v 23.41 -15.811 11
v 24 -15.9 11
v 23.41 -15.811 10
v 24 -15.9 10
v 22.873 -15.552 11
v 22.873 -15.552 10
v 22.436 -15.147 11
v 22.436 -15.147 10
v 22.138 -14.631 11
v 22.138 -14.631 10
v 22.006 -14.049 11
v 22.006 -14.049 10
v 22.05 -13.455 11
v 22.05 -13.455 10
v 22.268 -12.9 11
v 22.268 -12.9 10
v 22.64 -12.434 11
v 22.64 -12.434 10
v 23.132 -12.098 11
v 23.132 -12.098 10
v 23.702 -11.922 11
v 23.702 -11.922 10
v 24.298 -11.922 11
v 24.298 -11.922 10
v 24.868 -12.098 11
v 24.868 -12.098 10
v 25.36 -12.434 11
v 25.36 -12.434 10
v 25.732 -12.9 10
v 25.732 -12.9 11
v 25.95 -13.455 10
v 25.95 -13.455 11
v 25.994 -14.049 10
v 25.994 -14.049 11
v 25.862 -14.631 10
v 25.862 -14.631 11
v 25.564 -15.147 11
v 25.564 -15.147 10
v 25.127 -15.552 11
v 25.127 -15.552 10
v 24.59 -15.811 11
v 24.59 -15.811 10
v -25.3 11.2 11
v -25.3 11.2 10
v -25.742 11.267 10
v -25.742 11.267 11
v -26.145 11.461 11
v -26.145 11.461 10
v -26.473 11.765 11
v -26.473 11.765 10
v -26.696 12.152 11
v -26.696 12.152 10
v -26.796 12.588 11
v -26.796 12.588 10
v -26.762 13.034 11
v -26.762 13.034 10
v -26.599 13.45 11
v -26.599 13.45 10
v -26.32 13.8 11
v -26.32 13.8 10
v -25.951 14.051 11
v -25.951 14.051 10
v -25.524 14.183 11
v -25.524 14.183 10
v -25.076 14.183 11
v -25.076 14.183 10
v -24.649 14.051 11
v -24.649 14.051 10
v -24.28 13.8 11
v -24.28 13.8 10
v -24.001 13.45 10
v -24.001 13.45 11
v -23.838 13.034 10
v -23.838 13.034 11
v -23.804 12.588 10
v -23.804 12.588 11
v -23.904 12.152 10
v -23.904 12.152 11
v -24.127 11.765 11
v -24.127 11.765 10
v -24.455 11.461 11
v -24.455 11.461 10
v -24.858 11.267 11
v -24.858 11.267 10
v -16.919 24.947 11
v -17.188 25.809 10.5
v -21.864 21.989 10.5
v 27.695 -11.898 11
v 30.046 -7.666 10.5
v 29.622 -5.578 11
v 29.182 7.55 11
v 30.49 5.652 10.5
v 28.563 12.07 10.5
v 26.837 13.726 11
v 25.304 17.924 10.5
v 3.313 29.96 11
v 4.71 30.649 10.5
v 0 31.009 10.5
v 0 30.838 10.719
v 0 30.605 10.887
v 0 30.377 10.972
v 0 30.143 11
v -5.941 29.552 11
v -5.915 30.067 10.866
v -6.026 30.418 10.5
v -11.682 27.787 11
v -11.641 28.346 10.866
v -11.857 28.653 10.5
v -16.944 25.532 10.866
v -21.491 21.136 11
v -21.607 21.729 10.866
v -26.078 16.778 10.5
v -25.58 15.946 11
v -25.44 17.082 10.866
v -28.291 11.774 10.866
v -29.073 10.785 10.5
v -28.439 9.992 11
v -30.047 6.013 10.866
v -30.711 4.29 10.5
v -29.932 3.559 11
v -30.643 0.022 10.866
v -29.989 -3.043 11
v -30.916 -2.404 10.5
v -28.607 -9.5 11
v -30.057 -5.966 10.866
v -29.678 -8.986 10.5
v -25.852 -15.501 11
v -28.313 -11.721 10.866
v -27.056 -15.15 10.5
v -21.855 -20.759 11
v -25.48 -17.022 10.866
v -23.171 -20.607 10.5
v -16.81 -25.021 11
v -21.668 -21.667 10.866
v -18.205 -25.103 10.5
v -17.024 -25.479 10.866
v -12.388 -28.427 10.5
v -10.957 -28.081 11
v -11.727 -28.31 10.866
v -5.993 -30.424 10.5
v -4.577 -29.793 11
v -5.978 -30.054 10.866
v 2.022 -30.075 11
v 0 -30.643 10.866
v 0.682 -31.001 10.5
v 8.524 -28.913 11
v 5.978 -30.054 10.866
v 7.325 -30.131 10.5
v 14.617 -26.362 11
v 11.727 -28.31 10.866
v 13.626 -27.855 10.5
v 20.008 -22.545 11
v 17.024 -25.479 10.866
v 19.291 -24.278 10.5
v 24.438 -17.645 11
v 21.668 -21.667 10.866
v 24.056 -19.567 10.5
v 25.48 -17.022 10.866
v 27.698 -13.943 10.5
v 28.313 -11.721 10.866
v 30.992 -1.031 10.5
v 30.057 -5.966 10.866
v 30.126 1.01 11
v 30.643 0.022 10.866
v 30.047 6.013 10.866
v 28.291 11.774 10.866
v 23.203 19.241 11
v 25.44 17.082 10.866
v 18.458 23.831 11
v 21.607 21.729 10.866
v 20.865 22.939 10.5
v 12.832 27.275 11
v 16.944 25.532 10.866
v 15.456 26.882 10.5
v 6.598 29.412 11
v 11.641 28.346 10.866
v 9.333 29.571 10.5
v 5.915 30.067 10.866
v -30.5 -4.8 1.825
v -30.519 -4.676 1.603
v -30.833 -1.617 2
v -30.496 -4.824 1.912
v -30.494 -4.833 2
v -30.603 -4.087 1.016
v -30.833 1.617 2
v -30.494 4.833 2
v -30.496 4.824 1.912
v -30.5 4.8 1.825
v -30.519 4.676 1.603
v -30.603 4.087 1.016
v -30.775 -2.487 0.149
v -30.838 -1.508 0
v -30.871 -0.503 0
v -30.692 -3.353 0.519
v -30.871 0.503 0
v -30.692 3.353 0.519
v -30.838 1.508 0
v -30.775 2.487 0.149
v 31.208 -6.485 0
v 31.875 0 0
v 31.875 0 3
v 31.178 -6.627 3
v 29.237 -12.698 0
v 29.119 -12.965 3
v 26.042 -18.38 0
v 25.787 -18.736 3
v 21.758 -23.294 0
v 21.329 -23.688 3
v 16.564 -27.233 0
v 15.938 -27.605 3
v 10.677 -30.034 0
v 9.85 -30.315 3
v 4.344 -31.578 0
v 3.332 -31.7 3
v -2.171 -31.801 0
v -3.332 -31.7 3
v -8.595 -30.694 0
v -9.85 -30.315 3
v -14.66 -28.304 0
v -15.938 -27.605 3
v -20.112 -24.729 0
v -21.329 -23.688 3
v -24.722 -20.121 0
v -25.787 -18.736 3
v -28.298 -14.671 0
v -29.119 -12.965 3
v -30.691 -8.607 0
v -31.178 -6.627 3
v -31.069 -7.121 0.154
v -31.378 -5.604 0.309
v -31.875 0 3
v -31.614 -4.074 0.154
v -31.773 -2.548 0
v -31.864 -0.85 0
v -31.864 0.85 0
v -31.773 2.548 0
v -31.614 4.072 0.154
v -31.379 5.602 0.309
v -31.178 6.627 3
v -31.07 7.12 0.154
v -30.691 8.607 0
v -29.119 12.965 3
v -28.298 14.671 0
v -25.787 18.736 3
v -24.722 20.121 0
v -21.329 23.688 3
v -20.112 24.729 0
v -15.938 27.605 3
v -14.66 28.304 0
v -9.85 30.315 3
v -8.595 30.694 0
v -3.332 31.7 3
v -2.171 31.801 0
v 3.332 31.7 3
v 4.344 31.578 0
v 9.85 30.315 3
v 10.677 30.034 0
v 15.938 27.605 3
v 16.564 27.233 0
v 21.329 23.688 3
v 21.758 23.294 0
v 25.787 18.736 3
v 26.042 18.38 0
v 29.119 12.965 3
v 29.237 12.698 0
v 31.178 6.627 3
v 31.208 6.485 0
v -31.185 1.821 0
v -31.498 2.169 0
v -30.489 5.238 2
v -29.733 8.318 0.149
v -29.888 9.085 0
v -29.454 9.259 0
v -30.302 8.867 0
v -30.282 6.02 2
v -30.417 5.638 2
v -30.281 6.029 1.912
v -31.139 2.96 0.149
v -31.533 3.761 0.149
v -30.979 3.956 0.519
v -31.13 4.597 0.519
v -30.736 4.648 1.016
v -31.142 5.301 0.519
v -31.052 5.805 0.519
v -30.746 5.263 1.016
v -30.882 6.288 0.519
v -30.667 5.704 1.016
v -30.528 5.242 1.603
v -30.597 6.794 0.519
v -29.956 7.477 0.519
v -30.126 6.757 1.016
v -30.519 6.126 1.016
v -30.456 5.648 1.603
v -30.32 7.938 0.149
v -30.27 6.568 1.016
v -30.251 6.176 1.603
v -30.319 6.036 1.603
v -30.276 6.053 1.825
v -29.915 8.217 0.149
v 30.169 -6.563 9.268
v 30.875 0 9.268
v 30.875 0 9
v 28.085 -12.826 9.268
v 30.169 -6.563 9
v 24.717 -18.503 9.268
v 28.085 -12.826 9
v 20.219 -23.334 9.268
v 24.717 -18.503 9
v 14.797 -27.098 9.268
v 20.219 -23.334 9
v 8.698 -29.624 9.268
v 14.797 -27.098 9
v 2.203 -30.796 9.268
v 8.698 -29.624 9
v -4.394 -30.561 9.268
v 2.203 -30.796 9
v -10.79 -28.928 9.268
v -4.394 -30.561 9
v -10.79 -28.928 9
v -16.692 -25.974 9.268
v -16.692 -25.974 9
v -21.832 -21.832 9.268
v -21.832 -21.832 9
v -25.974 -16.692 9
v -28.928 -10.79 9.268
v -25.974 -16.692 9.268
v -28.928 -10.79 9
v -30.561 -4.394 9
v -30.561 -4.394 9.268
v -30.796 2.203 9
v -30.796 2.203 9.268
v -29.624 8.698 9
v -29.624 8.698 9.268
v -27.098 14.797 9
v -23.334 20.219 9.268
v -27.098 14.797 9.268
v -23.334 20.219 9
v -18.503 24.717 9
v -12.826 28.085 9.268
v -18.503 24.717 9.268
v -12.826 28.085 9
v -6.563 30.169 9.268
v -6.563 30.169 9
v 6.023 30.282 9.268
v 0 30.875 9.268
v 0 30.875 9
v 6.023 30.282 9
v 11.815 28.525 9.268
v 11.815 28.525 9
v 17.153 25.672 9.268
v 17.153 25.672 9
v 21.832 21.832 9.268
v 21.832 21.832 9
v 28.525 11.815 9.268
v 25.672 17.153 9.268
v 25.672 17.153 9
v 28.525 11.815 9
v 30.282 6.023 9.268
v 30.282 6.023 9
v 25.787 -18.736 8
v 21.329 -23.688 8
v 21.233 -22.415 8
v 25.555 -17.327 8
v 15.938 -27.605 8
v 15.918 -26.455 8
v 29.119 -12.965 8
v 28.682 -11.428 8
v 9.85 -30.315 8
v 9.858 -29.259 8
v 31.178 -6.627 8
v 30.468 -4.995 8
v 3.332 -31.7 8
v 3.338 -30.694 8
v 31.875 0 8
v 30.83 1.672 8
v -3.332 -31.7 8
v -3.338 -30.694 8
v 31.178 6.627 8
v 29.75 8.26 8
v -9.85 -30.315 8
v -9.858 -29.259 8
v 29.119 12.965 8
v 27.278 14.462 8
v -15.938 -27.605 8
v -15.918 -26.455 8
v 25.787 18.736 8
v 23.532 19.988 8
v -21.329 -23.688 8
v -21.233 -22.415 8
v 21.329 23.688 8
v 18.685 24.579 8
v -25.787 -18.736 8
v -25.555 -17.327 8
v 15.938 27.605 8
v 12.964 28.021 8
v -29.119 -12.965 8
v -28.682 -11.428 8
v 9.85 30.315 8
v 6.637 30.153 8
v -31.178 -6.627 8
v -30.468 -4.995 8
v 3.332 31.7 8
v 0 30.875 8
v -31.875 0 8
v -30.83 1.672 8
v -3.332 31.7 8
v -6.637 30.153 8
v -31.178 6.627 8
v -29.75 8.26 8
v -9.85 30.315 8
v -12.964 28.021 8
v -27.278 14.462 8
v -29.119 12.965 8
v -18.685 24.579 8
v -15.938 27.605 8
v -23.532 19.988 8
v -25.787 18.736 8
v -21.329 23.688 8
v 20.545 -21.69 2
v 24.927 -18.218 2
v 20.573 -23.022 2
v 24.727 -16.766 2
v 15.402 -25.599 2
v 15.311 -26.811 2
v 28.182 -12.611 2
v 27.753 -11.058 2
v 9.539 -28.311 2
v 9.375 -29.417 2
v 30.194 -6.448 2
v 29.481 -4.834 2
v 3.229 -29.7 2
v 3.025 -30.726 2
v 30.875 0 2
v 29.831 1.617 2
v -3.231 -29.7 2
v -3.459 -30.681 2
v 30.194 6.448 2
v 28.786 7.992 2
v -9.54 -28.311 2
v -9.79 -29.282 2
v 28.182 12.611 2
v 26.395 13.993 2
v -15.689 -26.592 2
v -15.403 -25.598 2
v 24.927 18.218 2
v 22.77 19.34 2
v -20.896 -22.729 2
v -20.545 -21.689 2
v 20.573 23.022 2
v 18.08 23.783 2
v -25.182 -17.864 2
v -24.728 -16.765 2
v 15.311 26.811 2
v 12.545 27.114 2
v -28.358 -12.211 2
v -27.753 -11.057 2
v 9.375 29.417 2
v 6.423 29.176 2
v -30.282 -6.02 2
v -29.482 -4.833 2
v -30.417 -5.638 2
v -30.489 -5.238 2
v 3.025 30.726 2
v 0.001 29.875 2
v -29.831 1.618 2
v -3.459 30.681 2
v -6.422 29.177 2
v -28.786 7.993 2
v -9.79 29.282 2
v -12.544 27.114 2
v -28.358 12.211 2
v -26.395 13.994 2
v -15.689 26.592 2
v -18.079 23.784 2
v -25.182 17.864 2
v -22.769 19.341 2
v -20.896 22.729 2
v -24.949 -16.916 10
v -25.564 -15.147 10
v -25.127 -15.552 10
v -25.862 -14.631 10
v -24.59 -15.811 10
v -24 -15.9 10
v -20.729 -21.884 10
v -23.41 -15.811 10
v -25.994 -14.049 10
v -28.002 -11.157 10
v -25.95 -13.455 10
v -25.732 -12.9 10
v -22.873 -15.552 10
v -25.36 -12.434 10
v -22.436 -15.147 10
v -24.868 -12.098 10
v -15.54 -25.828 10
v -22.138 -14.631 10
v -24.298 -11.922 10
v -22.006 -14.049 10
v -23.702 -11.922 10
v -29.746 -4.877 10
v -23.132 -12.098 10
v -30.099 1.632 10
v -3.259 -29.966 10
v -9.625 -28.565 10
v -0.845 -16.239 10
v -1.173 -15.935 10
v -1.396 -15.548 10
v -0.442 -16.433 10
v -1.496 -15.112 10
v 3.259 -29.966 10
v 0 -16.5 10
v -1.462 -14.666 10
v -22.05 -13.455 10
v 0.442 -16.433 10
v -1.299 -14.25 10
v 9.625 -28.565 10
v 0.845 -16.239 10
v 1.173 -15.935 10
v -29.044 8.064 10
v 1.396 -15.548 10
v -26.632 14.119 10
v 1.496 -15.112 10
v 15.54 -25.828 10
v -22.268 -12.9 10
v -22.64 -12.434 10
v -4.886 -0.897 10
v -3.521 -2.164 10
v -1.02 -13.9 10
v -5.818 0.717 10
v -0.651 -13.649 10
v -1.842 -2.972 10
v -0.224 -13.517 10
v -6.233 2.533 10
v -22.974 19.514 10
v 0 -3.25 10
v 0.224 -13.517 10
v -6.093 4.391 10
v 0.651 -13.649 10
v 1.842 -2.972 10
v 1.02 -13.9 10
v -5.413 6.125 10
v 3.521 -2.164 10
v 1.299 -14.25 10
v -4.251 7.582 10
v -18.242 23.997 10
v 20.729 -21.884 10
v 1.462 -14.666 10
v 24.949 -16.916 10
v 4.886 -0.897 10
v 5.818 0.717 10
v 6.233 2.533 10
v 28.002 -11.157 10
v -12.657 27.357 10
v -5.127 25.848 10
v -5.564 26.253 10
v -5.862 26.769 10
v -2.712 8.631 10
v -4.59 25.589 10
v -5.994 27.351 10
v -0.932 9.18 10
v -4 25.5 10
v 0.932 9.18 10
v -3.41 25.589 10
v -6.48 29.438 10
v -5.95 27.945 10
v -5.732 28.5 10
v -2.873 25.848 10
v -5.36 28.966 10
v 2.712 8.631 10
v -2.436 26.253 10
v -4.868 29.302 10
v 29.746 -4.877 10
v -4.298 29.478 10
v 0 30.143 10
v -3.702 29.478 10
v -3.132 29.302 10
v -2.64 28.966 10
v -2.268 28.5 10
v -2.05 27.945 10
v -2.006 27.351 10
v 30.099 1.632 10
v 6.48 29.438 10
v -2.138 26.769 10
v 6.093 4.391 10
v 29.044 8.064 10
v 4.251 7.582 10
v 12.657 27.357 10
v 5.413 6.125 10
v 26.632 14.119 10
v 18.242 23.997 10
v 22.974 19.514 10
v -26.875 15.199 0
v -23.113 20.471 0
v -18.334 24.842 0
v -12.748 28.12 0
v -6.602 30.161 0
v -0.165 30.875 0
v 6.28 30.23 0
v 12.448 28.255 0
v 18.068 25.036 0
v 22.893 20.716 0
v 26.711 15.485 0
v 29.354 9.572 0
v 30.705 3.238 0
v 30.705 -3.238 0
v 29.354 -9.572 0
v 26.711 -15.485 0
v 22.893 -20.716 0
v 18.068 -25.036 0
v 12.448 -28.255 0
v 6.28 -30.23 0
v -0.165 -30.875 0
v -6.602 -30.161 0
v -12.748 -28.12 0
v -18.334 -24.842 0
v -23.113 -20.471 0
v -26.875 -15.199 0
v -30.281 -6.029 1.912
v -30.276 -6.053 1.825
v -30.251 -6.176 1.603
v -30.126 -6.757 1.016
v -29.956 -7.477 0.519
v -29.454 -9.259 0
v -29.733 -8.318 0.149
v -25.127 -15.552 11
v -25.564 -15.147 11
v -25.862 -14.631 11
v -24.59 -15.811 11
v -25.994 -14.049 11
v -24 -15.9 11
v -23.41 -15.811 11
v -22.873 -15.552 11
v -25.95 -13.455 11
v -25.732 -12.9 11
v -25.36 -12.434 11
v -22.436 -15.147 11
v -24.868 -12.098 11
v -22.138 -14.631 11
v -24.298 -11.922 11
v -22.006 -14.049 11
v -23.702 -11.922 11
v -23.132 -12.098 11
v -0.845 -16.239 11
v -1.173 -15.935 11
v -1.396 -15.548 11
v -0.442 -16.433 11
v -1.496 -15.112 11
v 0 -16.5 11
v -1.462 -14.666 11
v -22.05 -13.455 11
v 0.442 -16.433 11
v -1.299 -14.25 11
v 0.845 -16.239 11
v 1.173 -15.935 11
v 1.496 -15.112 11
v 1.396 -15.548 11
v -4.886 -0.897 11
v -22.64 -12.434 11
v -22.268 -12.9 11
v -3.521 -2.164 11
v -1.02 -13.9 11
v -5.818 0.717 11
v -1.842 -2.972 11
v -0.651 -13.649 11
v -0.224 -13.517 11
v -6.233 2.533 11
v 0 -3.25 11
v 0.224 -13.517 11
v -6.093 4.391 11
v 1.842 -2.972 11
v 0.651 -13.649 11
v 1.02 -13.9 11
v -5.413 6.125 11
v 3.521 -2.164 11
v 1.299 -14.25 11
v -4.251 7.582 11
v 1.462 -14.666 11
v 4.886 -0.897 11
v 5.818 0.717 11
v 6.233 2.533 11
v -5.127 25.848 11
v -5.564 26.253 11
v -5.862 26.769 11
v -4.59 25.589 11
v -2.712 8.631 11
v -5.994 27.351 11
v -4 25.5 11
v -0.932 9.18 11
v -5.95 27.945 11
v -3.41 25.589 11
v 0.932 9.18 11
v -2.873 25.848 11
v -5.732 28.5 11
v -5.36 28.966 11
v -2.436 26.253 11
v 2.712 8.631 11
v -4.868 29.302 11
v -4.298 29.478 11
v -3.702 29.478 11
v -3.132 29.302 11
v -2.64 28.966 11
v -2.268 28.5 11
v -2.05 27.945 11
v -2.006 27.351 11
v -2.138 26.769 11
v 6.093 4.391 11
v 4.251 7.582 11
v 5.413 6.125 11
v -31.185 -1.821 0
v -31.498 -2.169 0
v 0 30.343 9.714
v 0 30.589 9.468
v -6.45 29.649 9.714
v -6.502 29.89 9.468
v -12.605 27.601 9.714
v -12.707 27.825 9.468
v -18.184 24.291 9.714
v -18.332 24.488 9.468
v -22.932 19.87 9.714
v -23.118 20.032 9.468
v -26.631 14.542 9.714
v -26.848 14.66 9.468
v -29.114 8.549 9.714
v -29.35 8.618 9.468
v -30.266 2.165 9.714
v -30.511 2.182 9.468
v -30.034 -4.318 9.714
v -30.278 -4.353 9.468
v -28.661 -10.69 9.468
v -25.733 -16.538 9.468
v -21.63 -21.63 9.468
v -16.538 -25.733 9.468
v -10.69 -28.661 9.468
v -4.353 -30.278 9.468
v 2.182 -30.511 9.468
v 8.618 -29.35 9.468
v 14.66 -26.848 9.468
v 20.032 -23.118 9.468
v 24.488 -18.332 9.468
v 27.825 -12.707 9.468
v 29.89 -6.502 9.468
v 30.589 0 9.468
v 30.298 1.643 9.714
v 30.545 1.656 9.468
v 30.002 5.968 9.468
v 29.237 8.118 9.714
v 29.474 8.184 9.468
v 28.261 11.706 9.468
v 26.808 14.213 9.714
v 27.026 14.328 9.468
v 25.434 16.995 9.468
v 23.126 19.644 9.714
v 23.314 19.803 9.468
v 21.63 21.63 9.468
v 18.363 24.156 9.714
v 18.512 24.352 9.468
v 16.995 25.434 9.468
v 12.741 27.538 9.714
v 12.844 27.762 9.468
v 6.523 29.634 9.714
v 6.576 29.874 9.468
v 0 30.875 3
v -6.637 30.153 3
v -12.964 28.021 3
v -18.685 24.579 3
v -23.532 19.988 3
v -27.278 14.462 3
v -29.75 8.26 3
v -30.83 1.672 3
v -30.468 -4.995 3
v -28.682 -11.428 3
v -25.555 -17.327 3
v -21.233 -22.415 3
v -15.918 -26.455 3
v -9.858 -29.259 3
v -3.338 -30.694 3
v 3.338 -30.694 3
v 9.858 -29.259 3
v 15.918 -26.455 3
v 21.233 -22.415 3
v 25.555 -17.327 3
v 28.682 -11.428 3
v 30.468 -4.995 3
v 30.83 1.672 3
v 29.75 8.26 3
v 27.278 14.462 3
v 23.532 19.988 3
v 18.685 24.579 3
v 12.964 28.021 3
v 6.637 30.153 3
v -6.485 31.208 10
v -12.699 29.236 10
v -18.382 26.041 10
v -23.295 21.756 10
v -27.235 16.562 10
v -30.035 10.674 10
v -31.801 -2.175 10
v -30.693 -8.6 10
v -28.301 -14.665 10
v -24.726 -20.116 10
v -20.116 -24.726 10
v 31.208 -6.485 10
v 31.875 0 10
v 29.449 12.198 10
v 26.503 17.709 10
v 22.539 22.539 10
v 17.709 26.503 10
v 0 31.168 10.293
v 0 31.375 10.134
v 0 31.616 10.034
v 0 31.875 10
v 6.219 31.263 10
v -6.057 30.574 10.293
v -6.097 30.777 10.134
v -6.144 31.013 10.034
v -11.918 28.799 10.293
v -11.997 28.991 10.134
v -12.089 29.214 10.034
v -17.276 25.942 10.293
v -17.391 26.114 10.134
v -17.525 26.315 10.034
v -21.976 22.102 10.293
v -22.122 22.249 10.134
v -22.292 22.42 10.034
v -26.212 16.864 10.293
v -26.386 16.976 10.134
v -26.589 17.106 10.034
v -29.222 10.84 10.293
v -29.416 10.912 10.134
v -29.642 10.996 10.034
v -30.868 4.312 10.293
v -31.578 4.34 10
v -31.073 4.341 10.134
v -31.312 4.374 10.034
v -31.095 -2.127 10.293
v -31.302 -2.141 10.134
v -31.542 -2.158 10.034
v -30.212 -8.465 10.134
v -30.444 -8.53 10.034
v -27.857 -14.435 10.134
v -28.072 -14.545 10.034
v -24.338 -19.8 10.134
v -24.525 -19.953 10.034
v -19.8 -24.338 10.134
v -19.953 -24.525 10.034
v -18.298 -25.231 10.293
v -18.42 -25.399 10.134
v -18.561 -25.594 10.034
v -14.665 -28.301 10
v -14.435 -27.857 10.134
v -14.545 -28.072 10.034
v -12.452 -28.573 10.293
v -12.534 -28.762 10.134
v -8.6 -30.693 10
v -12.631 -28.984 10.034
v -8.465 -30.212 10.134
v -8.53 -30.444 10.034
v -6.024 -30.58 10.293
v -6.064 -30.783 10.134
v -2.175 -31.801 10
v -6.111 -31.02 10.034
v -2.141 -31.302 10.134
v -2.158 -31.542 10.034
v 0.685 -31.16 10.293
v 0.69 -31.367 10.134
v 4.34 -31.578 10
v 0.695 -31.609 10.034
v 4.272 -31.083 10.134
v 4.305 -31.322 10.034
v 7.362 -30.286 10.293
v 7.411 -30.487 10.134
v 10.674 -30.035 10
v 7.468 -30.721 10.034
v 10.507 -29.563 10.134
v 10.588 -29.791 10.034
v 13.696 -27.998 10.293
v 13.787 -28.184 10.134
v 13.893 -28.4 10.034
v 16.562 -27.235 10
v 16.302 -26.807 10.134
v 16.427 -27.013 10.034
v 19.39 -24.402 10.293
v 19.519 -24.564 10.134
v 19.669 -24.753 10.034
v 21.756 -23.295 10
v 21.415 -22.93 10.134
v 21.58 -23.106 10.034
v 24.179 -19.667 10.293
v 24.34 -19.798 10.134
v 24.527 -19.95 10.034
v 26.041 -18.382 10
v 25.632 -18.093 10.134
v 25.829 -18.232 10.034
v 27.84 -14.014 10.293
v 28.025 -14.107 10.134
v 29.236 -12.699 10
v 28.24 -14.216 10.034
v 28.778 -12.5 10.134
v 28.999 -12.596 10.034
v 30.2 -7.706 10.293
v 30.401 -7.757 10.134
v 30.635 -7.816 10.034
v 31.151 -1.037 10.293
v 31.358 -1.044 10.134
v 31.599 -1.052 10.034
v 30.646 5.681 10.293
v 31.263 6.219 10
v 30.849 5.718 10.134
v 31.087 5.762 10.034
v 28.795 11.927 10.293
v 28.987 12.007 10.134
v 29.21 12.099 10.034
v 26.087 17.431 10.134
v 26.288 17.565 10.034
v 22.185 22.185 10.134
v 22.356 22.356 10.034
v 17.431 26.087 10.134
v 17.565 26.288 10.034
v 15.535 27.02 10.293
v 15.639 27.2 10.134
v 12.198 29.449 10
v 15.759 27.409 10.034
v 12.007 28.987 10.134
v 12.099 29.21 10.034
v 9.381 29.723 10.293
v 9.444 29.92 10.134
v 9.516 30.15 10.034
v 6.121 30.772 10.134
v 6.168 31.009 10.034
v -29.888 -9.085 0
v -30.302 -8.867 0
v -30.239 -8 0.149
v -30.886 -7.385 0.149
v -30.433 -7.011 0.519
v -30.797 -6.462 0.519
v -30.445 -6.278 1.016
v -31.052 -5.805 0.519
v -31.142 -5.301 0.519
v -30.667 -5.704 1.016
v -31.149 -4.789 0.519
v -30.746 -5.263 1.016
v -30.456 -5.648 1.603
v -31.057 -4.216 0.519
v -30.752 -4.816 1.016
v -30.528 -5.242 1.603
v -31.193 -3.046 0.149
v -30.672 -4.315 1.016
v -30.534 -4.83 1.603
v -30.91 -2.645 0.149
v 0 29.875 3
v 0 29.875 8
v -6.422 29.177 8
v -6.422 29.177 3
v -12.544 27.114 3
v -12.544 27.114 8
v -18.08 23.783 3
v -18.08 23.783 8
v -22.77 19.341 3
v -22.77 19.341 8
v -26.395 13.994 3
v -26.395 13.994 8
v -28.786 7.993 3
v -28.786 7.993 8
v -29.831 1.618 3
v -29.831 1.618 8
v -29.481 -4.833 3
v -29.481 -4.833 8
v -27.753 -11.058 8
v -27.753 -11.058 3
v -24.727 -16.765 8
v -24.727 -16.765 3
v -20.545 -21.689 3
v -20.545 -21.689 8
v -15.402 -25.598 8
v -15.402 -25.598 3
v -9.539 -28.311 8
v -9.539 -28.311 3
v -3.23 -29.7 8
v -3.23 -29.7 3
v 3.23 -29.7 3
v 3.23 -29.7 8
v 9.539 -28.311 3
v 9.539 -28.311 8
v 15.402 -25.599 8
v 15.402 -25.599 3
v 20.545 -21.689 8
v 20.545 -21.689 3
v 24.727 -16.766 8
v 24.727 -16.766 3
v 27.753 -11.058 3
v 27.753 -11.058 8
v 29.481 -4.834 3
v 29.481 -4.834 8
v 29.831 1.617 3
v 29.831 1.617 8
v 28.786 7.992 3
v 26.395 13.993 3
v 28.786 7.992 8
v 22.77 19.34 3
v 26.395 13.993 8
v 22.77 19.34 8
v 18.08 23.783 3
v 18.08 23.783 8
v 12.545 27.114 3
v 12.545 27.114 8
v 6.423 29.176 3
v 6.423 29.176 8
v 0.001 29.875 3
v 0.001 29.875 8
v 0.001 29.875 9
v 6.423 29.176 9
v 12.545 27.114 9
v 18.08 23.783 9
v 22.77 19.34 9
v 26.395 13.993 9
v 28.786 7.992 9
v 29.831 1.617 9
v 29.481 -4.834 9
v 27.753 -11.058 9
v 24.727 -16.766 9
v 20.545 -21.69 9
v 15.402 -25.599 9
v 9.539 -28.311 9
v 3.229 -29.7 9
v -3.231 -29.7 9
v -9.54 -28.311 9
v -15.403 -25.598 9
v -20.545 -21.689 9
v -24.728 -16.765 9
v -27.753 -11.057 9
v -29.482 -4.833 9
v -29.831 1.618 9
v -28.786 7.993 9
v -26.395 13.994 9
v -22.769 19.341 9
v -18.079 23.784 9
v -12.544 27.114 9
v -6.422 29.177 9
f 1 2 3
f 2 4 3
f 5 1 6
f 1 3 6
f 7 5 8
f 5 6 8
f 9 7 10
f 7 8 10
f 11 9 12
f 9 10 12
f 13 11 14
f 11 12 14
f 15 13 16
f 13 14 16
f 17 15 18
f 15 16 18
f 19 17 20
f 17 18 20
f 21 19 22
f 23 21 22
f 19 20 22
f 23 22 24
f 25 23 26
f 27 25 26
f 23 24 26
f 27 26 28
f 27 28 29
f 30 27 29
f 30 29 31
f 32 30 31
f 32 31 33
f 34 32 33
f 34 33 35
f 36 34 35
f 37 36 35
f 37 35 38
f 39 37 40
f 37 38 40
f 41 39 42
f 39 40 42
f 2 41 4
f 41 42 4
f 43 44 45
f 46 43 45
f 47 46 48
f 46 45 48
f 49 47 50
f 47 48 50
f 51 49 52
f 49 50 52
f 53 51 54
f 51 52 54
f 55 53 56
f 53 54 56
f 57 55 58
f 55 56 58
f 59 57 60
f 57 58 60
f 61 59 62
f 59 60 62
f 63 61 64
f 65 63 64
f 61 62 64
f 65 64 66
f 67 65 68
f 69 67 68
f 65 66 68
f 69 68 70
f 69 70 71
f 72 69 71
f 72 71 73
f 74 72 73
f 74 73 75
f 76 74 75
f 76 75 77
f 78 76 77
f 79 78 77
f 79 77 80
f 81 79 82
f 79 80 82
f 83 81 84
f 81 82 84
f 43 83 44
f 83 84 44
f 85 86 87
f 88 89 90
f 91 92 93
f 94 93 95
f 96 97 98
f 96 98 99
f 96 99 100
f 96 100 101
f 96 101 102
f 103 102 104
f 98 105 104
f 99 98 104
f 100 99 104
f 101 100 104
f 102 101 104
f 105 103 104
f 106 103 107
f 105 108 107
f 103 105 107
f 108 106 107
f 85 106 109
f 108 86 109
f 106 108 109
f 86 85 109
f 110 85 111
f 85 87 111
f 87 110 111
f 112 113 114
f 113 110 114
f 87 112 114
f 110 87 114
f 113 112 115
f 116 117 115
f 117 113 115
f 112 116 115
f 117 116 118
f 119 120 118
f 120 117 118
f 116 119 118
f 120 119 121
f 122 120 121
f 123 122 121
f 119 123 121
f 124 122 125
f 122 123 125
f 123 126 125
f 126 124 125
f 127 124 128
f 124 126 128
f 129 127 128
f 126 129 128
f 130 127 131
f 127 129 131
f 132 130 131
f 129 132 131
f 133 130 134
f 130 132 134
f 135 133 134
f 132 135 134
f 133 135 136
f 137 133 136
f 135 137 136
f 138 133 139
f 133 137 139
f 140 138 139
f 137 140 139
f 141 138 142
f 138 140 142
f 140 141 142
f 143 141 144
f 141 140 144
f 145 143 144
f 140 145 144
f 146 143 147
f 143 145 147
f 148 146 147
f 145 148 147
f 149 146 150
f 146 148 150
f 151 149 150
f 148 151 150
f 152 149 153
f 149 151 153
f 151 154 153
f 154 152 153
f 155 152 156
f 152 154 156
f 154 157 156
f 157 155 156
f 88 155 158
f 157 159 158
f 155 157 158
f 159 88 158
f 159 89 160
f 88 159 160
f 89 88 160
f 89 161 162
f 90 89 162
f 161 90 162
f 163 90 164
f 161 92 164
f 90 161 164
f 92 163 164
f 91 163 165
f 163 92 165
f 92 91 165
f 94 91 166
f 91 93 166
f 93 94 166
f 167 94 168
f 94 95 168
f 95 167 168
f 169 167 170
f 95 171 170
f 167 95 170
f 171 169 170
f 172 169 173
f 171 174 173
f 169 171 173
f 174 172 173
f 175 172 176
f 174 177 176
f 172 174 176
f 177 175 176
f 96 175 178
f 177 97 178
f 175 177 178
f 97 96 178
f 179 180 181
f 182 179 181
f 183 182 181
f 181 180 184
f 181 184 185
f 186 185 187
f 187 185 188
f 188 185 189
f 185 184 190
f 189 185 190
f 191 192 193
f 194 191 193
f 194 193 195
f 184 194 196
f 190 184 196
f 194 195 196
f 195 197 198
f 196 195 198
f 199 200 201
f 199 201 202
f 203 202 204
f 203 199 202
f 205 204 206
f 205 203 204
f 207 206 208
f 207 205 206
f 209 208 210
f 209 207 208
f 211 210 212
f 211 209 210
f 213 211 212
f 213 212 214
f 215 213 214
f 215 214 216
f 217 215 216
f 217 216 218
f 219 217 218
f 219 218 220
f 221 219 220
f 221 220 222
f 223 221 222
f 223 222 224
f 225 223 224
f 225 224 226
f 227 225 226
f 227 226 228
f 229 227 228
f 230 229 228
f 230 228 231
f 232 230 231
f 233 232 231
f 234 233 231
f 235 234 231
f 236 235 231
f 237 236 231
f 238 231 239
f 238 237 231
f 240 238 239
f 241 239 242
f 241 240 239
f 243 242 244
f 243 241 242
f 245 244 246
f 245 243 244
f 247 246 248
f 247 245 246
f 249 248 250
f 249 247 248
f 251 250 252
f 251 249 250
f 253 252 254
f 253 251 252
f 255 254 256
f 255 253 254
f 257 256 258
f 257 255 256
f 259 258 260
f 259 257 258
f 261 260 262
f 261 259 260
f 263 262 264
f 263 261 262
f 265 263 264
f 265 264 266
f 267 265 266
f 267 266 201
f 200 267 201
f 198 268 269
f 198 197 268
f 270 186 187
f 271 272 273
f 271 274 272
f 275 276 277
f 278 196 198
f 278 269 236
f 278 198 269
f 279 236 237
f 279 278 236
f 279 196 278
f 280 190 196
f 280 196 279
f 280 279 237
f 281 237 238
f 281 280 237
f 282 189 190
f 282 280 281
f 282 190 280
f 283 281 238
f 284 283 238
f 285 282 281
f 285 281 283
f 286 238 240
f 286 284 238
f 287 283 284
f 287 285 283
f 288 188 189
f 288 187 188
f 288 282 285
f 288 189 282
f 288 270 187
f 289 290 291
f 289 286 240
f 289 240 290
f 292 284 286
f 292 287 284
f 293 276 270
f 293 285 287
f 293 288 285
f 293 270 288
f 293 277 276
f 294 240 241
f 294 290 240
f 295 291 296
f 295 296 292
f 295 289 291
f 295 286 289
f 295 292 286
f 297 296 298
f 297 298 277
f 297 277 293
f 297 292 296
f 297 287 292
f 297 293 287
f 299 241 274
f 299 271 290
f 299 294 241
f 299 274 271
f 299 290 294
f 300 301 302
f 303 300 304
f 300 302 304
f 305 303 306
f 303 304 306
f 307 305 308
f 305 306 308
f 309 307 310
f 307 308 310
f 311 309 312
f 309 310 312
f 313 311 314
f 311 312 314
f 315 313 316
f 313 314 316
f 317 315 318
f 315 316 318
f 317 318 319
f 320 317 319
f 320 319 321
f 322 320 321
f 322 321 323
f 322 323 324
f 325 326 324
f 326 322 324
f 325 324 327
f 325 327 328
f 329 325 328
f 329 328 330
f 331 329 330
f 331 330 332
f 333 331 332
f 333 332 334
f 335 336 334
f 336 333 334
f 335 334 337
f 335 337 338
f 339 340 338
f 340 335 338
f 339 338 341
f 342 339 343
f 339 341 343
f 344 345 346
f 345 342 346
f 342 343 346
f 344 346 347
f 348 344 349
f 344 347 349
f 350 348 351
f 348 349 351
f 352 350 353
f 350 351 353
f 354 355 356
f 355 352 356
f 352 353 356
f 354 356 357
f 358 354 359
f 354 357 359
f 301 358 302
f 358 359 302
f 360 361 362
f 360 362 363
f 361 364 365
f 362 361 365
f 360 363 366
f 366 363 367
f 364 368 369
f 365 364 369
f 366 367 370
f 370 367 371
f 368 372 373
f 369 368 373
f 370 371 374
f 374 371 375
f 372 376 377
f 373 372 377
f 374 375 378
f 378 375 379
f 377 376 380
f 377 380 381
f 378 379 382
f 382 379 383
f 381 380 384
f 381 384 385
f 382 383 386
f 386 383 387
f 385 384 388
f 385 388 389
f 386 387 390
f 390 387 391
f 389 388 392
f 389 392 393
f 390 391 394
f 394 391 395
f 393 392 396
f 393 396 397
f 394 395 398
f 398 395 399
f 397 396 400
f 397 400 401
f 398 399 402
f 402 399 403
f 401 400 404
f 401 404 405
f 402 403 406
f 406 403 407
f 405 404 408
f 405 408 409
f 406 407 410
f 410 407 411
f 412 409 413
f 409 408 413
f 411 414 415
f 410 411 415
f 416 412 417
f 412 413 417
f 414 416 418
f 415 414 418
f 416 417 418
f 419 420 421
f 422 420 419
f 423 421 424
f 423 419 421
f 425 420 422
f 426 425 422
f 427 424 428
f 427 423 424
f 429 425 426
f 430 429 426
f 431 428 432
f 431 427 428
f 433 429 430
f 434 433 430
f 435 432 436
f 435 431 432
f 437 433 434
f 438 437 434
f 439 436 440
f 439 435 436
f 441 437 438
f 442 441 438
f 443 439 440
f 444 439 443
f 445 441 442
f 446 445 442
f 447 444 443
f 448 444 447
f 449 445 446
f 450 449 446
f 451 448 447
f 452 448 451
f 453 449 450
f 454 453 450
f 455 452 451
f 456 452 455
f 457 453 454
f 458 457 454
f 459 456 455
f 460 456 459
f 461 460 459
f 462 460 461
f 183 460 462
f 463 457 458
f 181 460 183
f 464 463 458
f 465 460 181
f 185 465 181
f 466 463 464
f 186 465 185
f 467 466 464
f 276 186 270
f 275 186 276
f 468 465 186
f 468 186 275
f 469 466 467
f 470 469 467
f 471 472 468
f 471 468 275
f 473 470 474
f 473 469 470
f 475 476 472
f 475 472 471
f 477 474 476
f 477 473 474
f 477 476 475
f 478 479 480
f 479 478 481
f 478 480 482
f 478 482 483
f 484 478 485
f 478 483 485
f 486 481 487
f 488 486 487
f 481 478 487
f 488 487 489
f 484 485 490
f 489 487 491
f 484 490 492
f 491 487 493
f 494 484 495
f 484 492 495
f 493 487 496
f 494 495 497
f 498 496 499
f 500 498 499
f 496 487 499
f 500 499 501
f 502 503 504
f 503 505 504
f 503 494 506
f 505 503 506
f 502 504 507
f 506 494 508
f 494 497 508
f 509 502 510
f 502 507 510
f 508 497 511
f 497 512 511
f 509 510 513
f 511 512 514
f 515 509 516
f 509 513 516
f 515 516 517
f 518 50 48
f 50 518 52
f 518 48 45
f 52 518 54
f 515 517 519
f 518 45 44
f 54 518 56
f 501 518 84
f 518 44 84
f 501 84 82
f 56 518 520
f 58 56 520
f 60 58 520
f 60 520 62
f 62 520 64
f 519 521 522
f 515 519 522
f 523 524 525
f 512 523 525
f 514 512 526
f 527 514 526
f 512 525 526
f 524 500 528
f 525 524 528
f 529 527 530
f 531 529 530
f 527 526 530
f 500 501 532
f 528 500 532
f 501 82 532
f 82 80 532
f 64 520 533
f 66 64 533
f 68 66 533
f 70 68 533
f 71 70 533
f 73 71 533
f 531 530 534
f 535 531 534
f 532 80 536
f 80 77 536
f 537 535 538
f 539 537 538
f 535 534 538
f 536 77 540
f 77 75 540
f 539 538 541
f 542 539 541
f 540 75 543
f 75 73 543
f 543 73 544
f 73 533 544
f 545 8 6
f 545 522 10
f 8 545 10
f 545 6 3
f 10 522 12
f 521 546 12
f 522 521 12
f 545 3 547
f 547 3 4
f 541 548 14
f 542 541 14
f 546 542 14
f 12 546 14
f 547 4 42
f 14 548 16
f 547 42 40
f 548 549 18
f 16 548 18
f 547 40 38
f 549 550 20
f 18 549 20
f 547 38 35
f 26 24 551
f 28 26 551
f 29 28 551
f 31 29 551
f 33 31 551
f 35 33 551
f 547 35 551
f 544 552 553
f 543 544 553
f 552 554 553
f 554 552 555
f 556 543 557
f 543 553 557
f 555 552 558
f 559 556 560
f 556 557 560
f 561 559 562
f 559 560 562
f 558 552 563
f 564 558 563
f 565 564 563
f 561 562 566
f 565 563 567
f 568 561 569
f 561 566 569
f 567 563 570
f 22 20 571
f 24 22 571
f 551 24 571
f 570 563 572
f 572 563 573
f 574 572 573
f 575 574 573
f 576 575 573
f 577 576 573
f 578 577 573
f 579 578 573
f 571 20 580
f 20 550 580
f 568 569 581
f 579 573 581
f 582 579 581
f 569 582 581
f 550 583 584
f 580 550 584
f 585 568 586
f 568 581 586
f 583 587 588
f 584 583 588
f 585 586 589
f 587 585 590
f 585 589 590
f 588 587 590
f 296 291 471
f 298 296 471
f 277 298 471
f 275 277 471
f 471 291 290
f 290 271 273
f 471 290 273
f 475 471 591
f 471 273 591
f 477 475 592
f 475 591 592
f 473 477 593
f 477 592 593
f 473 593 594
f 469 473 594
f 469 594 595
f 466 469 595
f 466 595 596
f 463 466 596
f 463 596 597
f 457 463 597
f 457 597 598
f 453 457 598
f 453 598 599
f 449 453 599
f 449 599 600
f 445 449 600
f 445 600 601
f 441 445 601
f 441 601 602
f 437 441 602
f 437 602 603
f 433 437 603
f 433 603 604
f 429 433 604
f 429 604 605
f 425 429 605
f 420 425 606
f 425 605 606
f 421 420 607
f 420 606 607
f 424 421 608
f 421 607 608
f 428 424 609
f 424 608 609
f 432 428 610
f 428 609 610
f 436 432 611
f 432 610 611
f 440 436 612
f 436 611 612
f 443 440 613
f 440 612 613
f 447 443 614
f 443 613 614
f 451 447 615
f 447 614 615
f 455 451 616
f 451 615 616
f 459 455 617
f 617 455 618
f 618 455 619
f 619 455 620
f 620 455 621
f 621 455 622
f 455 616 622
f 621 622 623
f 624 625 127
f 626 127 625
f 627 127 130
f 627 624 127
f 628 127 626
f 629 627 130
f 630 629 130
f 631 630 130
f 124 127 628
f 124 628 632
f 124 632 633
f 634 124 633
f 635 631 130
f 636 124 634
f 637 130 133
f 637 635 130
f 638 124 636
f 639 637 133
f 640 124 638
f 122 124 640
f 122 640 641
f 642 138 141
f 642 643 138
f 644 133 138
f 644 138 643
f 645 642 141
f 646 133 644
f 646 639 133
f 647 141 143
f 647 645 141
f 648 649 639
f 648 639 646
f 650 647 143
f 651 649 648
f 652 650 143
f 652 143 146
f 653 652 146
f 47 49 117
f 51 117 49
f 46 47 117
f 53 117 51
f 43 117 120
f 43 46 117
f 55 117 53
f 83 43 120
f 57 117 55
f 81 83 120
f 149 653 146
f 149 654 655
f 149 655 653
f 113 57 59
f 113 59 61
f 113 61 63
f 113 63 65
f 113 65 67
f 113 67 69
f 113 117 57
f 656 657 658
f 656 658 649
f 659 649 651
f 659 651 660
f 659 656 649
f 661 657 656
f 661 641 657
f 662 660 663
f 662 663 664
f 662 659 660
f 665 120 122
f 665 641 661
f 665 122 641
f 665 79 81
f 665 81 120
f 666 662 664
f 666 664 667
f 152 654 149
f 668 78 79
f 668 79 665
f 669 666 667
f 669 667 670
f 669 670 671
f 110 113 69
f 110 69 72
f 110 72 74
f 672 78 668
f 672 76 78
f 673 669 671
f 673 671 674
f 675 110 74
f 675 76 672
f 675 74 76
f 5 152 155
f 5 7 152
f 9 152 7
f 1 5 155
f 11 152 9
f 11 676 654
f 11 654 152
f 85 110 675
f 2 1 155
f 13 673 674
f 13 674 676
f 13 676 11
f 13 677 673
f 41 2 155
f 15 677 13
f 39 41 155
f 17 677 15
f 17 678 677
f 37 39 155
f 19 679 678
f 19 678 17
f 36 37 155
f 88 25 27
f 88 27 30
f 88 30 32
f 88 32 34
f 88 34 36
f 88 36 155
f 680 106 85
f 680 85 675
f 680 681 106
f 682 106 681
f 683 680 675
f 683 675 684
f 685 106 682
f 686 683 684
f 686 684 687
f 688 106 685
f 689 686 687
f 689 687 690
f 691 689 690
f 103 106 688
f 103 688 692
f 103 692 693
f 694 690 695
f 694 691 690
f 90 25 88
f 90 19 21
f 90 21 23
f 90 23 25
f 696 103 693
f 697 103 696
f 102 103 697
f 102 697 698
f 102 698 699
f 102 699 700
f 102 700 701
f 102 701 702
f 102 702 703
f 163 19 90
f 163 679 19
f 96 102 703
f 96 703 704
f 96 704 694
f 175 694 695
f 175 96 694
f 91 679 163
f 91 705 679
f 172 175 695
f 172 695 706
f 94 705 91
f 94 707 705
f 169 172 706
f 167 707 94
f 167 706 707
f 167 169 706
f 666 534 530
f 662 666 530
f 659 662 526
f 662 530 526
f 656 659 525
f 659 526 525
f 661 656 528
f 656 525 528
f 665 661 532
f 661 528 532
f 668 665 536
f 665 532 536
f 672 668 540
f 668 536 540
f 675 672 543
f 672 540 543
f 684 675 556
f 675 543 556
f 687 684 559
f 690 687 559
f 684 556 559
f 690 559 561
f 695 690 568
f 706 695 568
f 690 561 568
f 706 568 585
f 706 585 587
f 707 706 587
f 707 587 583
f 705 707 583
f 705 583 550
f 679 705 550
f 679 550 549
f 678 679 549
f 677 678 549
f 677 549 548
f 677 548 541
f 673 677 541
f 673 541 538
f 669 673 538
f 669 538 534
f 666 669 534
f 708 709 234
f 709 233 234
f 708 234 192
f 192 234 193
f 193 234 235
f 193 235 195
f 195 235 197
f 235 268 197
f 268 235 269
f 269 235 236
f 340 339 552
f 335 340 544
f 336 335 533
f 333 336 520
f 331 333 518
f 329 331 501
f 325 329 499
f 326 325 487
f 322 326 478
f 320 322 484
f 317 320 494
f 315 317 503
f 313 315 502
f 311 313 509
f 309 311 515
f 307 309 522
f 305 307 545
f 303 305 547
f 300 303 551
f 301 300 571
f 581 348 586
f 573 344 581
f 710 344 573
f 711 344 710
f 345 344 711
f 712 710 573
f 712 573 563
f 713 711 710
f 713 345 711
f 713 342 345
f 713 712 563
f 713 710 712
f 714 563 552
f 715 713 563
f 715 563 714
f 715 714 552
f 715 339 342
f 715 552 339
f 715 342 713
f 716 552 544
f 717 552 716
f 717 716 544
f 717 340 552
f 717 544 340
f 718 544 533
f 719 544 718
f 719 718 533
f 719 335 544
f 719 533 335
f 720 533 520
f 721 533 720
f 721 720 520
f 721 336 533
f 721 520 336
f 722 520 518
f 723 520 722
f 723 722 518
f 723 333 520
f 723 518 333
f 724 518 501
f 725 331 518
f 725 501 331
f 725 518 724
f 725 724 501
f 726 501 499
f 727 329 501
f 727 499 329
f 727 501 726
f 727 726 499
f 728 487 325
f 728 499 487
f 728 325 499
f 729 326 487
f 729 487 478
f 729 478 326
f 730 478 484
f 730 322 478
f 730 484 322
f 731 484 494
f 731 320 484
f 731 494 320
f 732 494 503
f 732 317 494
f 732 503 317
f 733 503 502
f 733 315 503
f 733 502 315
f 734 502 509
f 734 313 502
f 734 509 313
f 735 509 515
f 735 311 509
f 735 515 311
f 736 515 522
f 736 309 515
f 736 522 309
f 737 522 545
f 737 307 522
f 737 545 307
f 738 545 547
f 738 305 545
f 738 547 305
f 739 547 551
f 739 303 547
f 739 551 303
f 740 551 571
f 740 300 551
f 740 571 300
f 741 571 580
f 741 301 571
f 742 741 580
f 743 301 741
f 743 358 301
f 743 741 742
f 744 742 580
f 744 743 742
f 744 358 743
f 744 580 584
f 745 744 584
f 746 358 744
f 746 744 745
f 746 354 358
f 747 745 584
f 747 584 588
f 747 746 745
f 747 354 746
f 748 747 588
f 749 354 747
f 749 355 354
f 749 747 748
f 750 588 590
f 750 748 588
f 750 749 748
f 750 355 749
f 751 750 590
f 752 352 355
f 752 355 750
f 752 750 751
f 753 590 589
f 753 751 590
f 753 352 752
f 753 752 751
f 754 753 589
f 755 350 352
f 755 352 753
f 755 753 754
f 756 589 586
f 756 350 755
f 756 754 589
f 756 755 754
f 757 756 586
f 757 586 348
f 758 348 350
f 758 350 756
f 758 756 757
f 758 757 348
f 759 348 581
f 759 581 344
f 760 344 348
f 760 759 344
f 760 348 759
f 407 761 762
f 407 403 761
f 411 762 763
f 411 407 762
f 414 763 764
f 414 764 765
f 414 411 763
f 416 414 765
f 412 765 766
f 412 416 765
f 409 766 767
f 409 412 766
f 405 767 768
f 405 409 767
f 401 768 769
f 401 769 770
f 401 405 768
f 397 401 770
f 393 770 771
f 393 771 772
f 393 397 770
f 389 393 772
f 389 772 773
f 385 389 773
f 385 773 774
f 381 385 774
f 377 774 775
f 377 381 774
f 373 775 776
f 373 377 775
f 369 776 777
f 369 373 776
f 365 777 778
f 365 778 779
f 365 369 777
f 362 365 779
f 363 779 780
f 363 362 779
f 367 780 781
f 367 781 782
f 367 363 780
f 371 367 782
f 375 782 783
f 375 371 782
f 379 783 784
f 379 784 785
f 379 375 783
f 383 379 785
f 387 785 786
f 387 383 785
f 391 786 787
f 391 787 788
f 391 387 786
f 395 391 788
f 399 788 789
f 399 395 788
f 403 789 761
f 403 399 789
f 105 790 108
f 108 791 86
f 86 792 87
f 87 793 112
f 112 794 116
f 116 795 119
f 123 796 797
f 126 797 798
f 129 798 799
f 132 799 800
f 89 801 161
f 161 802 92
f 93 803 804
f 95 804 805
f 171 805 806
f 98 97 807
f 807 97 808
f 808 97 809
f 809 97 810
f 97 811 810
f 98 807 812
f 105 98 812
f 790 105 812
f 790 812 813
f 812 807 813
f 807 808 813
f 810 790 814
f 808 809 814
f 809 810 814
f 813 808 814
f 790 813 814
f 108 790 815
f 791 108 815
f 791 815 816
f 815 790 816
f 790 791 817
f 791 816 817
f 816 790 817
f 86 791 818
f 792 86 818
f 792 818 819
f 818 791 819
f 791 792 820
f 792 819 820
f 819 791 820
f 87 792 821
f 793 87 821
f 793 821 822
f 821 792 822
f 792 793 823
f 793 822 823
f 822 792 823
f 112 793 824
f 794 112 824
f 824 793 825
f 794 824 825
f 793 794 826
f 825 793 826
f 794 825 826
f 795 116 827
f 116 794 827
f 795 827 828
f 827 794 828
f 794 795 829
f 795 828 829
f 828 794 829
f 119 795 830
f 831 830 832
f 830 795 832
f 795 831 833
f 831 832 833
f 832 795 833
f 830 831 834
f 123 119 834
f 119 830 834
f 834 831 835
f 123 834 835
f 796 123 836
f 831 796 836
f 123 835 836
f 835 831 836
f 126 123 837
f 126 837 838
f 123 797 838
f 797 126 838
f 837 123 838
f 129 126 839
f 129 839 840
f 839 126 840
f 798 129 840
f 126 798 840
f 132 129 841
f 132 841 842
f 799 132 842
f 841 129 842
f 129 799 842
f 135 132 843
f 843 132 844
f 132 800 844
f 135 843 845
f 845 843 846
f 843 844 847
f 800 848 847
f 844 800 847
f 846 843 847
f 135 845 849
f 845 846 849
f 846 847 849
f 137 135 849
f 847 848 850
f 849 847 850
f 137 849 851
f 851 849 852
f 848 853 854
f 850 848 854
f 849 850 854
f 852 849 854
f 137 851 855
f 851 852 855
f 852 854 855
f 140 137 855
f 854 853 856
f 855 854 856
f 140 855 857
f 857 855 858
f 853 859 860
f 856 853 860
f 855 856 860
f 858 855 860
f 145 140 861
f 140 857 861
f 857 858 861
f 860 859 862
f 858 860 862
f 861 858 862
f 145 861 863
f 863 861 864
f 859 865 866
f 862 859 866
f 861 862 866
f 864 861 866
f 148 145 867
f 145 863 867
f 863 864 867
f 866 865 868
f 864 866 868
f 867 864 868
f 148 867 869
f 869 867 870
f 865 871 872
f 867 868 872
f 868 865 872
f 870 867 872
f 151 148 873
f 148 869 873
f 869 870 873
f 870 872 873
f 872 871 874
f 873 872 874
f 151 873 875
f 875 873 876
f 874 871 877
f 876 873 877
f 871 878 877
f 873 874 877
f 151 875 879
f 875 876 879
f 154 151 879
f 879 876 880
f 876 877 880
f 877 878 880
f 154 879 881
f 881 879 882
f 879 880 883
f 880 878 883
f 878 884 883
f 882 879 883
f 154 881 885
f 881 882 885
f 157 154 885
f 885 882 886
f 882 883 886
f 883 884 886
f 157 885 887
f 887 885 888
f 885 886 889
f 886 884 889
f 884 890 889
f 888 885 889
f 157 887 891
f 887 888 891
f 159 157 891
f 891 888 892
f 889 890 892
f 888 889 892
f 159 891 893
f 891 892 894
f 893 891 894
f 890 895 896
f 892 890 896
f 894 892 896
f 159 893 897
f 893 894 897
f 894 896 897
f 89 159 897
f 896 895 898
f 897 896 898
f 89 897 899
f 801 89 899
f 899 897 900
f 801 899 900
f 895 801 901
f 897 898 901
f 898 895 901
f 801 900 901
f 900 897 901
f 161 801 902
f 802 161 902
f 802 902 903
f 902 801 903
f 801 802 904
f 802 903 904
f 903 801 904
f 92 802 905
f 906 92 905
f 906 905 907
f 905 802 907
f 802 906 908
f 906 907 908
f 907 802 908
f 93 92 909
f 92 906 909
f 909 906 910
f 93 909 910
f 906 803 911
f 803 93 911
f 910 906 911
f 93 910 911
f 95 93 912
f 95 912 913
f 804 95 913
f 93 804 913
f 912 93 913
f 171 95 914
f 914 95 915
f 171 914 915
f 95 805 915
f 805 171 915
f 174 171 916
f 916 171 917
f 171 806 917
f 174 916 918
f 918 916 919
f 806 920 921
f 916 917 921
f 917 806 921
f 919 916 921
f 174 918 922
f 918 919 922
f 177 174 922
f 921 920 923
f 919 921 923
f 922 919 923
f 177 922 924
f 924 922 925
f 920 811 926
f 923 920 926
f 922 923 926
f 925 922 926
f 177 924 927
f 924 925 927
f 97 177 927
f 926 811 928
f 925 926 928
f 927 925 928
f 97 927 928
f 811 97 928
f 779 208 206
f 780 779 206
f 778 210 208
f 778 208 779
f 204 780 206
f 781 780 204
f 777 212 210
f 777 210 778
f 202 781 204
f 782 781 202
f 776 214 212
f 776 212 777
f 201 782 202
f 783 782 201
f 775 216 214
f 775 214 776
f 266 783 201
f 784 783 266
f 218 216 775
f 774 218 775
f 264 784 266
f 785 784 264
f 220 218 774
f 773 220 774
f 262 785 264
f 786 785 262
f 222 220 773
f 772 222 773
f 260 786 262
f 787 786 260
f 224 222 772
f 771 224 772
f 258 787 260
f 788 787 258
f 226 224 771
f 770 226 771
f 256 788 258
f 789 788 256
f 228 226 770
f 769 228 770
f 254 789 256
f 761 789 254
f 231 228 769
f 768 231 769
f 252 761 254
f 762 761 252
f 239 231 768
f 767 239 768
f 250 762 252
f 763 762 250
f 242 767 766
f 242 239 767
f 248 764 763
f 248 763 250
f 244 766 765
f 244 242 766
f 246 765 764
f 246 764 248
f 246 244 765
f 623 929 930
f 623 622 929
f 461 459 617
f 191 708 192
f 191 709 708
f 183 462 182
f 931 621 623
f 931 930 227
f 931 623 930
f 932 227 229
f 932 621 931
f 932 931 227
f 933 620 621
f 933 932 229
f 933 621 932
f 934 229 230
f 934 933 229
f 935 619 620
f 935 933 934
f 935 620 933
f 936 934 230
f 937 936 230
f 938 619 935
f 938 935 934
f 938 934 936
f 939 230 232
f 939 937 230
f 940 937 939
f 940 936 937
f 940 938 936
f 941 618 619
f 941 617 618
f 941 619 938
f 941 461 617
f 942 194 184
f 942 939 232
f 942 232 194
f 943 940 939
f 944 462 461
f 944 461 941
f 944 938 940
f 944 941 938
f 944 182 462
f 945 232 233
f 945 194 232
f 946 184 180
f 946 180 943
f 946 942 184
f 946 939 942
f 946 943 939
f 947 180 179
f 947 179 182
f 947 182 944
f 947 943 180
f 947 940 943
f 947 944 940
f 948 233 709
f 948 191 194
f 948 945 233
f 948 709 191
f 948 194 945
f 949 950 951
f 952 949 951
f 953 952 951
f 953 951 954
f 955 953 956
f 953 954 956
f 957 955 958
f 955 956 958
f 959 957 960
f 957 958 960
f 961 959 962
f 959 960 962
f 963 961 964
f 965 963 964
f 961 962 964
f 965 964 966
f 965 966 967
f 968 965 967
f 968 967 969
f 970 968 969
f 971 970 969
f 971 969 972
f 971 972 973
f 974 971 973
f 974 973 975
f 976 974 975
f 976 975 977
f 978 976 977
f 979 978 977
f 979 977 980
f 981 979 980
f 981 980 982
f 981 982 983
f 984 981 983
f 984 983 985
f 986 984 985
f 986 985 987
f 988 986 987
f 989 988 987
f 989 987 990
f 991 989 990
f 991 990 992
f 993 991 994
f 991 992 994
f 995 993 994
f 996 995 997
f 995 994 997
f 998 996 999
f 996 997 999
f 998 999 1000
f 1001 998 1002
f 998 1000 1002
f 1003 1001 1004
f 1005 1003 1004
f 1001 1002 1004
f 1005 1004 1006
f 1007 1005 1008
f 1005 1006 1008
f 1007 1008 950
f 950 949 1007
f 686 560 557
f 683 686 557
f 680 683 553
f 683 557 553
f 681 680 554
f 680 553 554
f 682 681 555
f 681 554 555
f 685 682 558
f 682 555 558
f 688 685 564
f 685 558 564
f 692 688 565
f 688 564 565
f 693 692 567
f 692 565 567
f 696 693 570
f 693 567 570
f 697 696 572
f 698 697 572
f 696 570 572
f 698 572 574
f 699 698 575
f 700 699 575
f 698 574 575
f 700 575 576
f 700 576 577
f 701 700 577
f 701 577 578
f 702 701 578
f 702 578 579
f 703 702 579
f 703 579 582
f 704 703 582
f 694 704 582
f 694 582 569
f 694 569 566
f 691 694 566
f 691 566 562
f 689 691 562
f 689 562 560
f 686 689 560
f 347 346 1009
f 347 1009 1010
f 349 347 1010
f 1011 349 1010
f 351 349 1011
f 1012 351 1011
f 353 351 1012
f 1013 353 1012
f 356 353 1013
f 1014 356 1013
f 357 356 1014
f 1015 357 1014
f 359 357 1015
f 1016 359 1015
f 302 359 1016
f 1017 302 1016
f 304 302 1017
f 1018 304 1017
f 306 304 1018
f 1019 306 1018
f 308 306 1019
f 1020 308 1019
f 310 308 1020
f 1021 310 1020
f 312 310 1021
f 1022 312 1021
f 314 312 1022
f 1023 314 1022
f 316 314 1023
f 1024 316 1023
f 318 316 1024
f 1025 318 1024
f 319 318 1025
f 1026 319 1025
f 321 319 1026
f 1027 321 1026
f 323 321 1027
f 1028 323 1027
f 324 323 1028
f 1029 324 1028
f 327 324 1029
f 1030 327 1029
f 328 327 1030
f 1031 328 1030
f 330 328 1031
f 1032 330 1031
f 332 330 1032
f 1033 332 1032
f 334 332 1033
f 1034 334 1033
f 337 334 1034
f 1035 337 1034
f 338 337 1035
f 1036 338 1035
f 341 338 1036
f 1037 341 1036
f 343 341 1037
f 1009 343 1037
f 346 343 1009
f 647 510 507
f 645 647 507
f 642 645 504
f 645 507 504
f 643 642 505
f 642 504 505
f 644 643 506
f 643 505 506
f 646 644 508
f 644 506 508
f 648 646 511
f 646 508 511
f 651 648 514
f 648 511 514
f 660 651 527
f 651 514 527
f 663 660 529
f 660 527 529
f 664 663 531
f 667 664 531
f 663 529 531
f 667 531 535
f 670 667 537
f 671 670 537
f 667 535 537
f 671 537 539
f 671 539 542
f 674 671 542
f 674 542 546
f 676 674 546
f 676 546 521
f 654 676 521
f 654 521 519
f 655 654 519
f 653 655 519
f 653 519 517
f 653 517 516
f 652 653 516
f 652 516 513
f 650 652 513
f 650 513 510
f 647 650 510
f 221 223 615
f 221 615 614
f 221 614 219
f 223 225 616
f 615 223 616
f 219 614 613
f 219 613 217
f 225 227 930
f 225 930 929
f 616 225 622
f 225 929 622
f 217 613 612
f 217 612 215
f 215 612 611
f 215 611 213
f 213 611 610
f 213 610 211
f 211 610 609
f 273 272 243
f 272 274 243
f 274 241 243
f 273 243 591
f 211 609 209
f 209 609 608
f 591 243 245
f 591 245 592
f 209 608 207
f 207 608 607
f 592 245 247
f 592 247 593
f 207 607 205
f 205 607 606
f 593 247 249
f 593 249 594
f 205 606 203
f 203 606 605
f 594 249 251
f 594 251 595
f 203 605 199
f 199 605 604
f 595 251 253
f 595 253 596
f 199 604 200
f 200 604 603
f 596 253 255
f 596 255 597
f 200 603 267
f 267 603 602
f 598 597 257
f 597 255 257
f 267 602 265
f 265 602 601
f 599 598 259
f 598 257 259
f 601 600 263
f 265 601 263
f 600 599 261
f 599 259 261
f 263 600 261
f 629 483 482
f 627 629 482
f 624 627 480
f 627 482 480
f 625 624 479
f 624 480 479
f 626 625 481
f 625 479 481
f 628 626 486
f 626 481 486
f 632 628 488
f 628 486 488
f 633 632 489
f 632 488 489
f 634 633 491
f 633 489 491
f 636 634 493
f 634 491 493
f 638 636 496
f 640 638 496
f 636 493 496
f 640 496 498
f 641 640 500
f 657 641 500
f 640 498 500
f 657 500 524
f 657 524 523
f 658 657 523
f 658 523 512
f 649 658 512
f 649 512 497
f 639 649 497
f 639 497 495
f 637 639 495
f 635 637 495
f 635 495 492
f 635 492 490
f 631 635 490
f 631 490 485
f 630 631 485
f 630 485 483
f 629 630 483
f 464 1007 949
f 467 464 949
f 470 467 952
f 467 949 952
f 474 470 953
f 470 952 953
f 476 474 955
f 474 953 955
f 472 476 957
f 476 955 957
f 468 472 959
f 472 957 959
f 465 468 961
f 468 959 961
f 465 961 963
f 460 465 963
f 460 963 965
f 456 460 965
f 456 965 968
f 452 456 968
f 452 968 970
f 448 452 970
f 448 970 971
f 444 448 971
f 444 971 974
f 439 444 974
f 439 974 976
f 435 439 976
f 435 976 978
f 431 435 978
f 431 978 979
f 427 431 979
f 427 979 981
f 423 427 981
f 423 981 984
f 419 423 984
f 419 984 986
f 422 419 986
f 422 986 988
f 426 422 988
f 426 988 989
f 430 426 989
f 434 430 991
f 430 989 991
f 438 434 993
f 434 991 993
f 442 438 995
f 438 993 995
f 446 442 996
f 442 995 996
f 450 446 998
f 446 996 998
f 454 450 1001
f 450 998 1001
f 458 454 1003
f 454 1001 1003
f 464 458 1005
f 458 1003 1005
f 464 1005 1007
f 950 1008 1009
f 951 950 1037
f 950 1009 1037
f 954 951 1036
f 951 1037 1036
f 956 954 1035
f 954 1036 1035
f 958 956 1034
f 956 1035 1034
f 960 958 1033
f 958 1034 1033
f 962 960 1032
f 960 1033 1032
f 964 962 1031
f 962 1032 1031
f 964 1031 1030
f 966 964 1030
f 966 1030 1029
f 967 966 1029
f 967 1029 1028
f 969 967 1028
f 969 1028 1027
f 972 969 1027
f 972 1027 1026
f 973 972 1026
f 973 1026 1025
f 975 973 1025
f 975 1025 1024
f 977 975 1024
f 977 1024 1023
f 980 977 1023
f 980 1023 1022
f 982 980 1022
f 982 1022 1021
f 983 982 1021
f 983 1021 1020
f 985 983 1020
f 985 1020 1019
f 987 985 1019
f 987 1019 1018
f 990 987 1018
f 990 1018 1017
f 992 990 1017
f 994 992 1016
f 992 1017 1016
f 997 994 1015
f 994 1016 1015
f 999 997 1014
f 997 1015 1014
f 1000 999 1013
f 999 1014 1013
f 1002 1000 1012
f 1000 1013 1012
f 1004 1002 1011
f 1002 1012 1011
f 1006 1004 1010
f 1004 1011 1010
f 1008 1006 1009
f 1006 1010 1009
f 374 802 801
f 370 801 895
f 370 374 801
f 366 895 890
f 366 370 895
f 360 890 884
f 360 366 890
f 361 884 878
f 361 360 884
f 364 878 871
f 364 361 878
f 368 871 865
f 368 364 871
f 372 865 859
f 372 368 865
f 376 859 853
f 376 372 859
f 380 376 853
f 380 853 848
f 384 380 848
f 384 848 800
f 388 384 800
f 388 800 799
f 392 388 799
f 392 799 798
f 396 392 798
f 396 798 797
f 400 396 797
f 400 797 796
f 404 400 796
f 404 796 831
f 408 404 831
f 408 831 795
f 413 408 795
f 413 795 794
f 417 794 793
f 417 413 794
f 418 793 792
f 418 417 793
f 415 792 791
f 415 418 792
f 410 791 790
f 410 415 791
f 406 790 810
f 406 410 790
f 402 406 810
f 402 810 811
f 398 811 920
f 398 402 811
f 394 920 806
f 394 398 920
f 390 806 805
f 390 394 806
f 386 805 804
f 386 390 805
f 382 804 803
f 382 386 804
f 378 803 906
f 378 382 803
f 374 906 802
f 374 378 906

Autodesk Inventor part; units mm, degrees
ref_plane "YZ Plane" through (0, 0, 0) normal (1, 0, 0) x (0, 1, 0)
ref_plane "XZ Plane" through (0, 0, 0) normal (0, 1, 0) x (-1, 0, 0)
ref_plane "XY Plane" through (0, 0, 0) normal (0, 0, 1) x (1, 0, 0)
sketch "Sketch1" plane through (0, 0, 0) normal (0, 0, 1) x (1, 0, 0)
  circle A0 centre (0, 0) radius 31.875
  dimension "d0" = 63.75
extrude "Extrusion1" add sketch "Sketch1" along normal blind 11
sketch "Sketch6" plane through (0, 0, 0) normal (1, 0, 0) x (0, 1, 0)
  line L0 (30.875, 8) -> (31.875, 8)
  line L1 (31.875, 8) -> (31.875, 3)
  line L2 (31.875, 3) -> (30.875, 3)
  line L3 (30.875, 3) -> (30.875, 8)
  line L4 (0, 0) -> (0, 11) construction
  line L5 (31.875, 11) -> (-31.875, 11) projected
  line L6 (-31.875, 0) -> (31.875, 0) projected
  circle A0 centre (31.875, 11) radius 1
  dimension "d62" = 1
  dimension "d63" = 5
  dimension "d65" = 31.875
  dimension "d66" = 63.75
  dimension "d67" = 3
  dimension "d81" = 2
revolve "Revolution1" cut sketch "Sketch6" angle 360 about axis through (0, 0, 0) along (0, 0, 1)
shell "Shell1" thickness 1 removed faces 1 at (5.5896, -2.5427, 0)
sketch "Sketch2" plane through (0, 0, 11) normal (0, 0, 1) x (1, 0, 0)
  circle A0 centre (0, 0) radius 31.875 projected
  point P0 (-4, 27.5)
  point P1 (-24, -13.9)
  point P2 (24, -13.9)
  dimension "d73" = 4
  dimension "d74" = 27.5
  dimension "d77" = 13.9
  dimension "d78" = 24
  dimension "d79" = 13.9
  dimension "d80" = 24
hole "Hole1" at (-4, 27.5, 11) at (24, -13.9, 11) at (-24, -13.9, 11) direction (0, 0, -1) diameter 4 end through all
sketch "Sketch3" plane through (0, 0, 11) normal (0, 0, 1) x (1, 0, 0)
  circle A0 centre (0, 0) radius 31.875 projected
  point P0 (-25.3, 12.7)
  dimension "d31" = 25.3
  dimension "d32" = 12.7
hole "Hole2" at (-25.3, 12.7, 11) direction (0, 0, -1) diameter 3 end through all
sketch "Sketch4" plane through (0, 0, 11) normal (0, 0, 1) x (1, 0, 0)
  point P0 (0, 0)
  point P1 (0, 3)
  dimension "d40" = 3
hole "Hole3" at (0, 3, 11) direction (0, 0, -1) diameter 12.5 end through all
sketch "Sketch5" plane through (0, 0, 11) normal (0, 0, 1) x (1, 0, 0)
  point P0 (0, 0)
  point P1 (0, -15)
  dimension "d48" = 15
hole "Hole4" at (0, -15, 11) direction (0, 0, -1) diameter 3 end through all
fillet "Fillet1" radius 1 1 edges at (0, -30.875, 11)
sketch "Sketch7" plane through (0, 0, 0) normal (0, 0, -1) x (-1, 0, 0)
  line L0 (0, 0) -> (28, 0) construction
  line L1 (28, -5) -> (28, 5) construction
  circle A0 centre (28, -5) radius 2.5
  circle A1 centre (28, 5) radius 2.5
  circle A2 centre (0, 0) radius 31.009 projected
  dimension "d83" = 28
  dimension "d84" = 10
  dimension "d85" = 5
  dimension "d86" = 5
extrude "Extrusion2" cut sketch "Sketch7" against normal blind 2 contours A0 | A1
fillet "Fillet2" radius 2 2 edges at (-30.4611, -5.4395, 0) (-30.4611, 5.4395, 0)
equation "\"d65\" = 0.5 * d66"
equation "\"d77\" = d79"
equation "\"d78\" = d80"
properties part number "407-02" material "Stainless Steel"
